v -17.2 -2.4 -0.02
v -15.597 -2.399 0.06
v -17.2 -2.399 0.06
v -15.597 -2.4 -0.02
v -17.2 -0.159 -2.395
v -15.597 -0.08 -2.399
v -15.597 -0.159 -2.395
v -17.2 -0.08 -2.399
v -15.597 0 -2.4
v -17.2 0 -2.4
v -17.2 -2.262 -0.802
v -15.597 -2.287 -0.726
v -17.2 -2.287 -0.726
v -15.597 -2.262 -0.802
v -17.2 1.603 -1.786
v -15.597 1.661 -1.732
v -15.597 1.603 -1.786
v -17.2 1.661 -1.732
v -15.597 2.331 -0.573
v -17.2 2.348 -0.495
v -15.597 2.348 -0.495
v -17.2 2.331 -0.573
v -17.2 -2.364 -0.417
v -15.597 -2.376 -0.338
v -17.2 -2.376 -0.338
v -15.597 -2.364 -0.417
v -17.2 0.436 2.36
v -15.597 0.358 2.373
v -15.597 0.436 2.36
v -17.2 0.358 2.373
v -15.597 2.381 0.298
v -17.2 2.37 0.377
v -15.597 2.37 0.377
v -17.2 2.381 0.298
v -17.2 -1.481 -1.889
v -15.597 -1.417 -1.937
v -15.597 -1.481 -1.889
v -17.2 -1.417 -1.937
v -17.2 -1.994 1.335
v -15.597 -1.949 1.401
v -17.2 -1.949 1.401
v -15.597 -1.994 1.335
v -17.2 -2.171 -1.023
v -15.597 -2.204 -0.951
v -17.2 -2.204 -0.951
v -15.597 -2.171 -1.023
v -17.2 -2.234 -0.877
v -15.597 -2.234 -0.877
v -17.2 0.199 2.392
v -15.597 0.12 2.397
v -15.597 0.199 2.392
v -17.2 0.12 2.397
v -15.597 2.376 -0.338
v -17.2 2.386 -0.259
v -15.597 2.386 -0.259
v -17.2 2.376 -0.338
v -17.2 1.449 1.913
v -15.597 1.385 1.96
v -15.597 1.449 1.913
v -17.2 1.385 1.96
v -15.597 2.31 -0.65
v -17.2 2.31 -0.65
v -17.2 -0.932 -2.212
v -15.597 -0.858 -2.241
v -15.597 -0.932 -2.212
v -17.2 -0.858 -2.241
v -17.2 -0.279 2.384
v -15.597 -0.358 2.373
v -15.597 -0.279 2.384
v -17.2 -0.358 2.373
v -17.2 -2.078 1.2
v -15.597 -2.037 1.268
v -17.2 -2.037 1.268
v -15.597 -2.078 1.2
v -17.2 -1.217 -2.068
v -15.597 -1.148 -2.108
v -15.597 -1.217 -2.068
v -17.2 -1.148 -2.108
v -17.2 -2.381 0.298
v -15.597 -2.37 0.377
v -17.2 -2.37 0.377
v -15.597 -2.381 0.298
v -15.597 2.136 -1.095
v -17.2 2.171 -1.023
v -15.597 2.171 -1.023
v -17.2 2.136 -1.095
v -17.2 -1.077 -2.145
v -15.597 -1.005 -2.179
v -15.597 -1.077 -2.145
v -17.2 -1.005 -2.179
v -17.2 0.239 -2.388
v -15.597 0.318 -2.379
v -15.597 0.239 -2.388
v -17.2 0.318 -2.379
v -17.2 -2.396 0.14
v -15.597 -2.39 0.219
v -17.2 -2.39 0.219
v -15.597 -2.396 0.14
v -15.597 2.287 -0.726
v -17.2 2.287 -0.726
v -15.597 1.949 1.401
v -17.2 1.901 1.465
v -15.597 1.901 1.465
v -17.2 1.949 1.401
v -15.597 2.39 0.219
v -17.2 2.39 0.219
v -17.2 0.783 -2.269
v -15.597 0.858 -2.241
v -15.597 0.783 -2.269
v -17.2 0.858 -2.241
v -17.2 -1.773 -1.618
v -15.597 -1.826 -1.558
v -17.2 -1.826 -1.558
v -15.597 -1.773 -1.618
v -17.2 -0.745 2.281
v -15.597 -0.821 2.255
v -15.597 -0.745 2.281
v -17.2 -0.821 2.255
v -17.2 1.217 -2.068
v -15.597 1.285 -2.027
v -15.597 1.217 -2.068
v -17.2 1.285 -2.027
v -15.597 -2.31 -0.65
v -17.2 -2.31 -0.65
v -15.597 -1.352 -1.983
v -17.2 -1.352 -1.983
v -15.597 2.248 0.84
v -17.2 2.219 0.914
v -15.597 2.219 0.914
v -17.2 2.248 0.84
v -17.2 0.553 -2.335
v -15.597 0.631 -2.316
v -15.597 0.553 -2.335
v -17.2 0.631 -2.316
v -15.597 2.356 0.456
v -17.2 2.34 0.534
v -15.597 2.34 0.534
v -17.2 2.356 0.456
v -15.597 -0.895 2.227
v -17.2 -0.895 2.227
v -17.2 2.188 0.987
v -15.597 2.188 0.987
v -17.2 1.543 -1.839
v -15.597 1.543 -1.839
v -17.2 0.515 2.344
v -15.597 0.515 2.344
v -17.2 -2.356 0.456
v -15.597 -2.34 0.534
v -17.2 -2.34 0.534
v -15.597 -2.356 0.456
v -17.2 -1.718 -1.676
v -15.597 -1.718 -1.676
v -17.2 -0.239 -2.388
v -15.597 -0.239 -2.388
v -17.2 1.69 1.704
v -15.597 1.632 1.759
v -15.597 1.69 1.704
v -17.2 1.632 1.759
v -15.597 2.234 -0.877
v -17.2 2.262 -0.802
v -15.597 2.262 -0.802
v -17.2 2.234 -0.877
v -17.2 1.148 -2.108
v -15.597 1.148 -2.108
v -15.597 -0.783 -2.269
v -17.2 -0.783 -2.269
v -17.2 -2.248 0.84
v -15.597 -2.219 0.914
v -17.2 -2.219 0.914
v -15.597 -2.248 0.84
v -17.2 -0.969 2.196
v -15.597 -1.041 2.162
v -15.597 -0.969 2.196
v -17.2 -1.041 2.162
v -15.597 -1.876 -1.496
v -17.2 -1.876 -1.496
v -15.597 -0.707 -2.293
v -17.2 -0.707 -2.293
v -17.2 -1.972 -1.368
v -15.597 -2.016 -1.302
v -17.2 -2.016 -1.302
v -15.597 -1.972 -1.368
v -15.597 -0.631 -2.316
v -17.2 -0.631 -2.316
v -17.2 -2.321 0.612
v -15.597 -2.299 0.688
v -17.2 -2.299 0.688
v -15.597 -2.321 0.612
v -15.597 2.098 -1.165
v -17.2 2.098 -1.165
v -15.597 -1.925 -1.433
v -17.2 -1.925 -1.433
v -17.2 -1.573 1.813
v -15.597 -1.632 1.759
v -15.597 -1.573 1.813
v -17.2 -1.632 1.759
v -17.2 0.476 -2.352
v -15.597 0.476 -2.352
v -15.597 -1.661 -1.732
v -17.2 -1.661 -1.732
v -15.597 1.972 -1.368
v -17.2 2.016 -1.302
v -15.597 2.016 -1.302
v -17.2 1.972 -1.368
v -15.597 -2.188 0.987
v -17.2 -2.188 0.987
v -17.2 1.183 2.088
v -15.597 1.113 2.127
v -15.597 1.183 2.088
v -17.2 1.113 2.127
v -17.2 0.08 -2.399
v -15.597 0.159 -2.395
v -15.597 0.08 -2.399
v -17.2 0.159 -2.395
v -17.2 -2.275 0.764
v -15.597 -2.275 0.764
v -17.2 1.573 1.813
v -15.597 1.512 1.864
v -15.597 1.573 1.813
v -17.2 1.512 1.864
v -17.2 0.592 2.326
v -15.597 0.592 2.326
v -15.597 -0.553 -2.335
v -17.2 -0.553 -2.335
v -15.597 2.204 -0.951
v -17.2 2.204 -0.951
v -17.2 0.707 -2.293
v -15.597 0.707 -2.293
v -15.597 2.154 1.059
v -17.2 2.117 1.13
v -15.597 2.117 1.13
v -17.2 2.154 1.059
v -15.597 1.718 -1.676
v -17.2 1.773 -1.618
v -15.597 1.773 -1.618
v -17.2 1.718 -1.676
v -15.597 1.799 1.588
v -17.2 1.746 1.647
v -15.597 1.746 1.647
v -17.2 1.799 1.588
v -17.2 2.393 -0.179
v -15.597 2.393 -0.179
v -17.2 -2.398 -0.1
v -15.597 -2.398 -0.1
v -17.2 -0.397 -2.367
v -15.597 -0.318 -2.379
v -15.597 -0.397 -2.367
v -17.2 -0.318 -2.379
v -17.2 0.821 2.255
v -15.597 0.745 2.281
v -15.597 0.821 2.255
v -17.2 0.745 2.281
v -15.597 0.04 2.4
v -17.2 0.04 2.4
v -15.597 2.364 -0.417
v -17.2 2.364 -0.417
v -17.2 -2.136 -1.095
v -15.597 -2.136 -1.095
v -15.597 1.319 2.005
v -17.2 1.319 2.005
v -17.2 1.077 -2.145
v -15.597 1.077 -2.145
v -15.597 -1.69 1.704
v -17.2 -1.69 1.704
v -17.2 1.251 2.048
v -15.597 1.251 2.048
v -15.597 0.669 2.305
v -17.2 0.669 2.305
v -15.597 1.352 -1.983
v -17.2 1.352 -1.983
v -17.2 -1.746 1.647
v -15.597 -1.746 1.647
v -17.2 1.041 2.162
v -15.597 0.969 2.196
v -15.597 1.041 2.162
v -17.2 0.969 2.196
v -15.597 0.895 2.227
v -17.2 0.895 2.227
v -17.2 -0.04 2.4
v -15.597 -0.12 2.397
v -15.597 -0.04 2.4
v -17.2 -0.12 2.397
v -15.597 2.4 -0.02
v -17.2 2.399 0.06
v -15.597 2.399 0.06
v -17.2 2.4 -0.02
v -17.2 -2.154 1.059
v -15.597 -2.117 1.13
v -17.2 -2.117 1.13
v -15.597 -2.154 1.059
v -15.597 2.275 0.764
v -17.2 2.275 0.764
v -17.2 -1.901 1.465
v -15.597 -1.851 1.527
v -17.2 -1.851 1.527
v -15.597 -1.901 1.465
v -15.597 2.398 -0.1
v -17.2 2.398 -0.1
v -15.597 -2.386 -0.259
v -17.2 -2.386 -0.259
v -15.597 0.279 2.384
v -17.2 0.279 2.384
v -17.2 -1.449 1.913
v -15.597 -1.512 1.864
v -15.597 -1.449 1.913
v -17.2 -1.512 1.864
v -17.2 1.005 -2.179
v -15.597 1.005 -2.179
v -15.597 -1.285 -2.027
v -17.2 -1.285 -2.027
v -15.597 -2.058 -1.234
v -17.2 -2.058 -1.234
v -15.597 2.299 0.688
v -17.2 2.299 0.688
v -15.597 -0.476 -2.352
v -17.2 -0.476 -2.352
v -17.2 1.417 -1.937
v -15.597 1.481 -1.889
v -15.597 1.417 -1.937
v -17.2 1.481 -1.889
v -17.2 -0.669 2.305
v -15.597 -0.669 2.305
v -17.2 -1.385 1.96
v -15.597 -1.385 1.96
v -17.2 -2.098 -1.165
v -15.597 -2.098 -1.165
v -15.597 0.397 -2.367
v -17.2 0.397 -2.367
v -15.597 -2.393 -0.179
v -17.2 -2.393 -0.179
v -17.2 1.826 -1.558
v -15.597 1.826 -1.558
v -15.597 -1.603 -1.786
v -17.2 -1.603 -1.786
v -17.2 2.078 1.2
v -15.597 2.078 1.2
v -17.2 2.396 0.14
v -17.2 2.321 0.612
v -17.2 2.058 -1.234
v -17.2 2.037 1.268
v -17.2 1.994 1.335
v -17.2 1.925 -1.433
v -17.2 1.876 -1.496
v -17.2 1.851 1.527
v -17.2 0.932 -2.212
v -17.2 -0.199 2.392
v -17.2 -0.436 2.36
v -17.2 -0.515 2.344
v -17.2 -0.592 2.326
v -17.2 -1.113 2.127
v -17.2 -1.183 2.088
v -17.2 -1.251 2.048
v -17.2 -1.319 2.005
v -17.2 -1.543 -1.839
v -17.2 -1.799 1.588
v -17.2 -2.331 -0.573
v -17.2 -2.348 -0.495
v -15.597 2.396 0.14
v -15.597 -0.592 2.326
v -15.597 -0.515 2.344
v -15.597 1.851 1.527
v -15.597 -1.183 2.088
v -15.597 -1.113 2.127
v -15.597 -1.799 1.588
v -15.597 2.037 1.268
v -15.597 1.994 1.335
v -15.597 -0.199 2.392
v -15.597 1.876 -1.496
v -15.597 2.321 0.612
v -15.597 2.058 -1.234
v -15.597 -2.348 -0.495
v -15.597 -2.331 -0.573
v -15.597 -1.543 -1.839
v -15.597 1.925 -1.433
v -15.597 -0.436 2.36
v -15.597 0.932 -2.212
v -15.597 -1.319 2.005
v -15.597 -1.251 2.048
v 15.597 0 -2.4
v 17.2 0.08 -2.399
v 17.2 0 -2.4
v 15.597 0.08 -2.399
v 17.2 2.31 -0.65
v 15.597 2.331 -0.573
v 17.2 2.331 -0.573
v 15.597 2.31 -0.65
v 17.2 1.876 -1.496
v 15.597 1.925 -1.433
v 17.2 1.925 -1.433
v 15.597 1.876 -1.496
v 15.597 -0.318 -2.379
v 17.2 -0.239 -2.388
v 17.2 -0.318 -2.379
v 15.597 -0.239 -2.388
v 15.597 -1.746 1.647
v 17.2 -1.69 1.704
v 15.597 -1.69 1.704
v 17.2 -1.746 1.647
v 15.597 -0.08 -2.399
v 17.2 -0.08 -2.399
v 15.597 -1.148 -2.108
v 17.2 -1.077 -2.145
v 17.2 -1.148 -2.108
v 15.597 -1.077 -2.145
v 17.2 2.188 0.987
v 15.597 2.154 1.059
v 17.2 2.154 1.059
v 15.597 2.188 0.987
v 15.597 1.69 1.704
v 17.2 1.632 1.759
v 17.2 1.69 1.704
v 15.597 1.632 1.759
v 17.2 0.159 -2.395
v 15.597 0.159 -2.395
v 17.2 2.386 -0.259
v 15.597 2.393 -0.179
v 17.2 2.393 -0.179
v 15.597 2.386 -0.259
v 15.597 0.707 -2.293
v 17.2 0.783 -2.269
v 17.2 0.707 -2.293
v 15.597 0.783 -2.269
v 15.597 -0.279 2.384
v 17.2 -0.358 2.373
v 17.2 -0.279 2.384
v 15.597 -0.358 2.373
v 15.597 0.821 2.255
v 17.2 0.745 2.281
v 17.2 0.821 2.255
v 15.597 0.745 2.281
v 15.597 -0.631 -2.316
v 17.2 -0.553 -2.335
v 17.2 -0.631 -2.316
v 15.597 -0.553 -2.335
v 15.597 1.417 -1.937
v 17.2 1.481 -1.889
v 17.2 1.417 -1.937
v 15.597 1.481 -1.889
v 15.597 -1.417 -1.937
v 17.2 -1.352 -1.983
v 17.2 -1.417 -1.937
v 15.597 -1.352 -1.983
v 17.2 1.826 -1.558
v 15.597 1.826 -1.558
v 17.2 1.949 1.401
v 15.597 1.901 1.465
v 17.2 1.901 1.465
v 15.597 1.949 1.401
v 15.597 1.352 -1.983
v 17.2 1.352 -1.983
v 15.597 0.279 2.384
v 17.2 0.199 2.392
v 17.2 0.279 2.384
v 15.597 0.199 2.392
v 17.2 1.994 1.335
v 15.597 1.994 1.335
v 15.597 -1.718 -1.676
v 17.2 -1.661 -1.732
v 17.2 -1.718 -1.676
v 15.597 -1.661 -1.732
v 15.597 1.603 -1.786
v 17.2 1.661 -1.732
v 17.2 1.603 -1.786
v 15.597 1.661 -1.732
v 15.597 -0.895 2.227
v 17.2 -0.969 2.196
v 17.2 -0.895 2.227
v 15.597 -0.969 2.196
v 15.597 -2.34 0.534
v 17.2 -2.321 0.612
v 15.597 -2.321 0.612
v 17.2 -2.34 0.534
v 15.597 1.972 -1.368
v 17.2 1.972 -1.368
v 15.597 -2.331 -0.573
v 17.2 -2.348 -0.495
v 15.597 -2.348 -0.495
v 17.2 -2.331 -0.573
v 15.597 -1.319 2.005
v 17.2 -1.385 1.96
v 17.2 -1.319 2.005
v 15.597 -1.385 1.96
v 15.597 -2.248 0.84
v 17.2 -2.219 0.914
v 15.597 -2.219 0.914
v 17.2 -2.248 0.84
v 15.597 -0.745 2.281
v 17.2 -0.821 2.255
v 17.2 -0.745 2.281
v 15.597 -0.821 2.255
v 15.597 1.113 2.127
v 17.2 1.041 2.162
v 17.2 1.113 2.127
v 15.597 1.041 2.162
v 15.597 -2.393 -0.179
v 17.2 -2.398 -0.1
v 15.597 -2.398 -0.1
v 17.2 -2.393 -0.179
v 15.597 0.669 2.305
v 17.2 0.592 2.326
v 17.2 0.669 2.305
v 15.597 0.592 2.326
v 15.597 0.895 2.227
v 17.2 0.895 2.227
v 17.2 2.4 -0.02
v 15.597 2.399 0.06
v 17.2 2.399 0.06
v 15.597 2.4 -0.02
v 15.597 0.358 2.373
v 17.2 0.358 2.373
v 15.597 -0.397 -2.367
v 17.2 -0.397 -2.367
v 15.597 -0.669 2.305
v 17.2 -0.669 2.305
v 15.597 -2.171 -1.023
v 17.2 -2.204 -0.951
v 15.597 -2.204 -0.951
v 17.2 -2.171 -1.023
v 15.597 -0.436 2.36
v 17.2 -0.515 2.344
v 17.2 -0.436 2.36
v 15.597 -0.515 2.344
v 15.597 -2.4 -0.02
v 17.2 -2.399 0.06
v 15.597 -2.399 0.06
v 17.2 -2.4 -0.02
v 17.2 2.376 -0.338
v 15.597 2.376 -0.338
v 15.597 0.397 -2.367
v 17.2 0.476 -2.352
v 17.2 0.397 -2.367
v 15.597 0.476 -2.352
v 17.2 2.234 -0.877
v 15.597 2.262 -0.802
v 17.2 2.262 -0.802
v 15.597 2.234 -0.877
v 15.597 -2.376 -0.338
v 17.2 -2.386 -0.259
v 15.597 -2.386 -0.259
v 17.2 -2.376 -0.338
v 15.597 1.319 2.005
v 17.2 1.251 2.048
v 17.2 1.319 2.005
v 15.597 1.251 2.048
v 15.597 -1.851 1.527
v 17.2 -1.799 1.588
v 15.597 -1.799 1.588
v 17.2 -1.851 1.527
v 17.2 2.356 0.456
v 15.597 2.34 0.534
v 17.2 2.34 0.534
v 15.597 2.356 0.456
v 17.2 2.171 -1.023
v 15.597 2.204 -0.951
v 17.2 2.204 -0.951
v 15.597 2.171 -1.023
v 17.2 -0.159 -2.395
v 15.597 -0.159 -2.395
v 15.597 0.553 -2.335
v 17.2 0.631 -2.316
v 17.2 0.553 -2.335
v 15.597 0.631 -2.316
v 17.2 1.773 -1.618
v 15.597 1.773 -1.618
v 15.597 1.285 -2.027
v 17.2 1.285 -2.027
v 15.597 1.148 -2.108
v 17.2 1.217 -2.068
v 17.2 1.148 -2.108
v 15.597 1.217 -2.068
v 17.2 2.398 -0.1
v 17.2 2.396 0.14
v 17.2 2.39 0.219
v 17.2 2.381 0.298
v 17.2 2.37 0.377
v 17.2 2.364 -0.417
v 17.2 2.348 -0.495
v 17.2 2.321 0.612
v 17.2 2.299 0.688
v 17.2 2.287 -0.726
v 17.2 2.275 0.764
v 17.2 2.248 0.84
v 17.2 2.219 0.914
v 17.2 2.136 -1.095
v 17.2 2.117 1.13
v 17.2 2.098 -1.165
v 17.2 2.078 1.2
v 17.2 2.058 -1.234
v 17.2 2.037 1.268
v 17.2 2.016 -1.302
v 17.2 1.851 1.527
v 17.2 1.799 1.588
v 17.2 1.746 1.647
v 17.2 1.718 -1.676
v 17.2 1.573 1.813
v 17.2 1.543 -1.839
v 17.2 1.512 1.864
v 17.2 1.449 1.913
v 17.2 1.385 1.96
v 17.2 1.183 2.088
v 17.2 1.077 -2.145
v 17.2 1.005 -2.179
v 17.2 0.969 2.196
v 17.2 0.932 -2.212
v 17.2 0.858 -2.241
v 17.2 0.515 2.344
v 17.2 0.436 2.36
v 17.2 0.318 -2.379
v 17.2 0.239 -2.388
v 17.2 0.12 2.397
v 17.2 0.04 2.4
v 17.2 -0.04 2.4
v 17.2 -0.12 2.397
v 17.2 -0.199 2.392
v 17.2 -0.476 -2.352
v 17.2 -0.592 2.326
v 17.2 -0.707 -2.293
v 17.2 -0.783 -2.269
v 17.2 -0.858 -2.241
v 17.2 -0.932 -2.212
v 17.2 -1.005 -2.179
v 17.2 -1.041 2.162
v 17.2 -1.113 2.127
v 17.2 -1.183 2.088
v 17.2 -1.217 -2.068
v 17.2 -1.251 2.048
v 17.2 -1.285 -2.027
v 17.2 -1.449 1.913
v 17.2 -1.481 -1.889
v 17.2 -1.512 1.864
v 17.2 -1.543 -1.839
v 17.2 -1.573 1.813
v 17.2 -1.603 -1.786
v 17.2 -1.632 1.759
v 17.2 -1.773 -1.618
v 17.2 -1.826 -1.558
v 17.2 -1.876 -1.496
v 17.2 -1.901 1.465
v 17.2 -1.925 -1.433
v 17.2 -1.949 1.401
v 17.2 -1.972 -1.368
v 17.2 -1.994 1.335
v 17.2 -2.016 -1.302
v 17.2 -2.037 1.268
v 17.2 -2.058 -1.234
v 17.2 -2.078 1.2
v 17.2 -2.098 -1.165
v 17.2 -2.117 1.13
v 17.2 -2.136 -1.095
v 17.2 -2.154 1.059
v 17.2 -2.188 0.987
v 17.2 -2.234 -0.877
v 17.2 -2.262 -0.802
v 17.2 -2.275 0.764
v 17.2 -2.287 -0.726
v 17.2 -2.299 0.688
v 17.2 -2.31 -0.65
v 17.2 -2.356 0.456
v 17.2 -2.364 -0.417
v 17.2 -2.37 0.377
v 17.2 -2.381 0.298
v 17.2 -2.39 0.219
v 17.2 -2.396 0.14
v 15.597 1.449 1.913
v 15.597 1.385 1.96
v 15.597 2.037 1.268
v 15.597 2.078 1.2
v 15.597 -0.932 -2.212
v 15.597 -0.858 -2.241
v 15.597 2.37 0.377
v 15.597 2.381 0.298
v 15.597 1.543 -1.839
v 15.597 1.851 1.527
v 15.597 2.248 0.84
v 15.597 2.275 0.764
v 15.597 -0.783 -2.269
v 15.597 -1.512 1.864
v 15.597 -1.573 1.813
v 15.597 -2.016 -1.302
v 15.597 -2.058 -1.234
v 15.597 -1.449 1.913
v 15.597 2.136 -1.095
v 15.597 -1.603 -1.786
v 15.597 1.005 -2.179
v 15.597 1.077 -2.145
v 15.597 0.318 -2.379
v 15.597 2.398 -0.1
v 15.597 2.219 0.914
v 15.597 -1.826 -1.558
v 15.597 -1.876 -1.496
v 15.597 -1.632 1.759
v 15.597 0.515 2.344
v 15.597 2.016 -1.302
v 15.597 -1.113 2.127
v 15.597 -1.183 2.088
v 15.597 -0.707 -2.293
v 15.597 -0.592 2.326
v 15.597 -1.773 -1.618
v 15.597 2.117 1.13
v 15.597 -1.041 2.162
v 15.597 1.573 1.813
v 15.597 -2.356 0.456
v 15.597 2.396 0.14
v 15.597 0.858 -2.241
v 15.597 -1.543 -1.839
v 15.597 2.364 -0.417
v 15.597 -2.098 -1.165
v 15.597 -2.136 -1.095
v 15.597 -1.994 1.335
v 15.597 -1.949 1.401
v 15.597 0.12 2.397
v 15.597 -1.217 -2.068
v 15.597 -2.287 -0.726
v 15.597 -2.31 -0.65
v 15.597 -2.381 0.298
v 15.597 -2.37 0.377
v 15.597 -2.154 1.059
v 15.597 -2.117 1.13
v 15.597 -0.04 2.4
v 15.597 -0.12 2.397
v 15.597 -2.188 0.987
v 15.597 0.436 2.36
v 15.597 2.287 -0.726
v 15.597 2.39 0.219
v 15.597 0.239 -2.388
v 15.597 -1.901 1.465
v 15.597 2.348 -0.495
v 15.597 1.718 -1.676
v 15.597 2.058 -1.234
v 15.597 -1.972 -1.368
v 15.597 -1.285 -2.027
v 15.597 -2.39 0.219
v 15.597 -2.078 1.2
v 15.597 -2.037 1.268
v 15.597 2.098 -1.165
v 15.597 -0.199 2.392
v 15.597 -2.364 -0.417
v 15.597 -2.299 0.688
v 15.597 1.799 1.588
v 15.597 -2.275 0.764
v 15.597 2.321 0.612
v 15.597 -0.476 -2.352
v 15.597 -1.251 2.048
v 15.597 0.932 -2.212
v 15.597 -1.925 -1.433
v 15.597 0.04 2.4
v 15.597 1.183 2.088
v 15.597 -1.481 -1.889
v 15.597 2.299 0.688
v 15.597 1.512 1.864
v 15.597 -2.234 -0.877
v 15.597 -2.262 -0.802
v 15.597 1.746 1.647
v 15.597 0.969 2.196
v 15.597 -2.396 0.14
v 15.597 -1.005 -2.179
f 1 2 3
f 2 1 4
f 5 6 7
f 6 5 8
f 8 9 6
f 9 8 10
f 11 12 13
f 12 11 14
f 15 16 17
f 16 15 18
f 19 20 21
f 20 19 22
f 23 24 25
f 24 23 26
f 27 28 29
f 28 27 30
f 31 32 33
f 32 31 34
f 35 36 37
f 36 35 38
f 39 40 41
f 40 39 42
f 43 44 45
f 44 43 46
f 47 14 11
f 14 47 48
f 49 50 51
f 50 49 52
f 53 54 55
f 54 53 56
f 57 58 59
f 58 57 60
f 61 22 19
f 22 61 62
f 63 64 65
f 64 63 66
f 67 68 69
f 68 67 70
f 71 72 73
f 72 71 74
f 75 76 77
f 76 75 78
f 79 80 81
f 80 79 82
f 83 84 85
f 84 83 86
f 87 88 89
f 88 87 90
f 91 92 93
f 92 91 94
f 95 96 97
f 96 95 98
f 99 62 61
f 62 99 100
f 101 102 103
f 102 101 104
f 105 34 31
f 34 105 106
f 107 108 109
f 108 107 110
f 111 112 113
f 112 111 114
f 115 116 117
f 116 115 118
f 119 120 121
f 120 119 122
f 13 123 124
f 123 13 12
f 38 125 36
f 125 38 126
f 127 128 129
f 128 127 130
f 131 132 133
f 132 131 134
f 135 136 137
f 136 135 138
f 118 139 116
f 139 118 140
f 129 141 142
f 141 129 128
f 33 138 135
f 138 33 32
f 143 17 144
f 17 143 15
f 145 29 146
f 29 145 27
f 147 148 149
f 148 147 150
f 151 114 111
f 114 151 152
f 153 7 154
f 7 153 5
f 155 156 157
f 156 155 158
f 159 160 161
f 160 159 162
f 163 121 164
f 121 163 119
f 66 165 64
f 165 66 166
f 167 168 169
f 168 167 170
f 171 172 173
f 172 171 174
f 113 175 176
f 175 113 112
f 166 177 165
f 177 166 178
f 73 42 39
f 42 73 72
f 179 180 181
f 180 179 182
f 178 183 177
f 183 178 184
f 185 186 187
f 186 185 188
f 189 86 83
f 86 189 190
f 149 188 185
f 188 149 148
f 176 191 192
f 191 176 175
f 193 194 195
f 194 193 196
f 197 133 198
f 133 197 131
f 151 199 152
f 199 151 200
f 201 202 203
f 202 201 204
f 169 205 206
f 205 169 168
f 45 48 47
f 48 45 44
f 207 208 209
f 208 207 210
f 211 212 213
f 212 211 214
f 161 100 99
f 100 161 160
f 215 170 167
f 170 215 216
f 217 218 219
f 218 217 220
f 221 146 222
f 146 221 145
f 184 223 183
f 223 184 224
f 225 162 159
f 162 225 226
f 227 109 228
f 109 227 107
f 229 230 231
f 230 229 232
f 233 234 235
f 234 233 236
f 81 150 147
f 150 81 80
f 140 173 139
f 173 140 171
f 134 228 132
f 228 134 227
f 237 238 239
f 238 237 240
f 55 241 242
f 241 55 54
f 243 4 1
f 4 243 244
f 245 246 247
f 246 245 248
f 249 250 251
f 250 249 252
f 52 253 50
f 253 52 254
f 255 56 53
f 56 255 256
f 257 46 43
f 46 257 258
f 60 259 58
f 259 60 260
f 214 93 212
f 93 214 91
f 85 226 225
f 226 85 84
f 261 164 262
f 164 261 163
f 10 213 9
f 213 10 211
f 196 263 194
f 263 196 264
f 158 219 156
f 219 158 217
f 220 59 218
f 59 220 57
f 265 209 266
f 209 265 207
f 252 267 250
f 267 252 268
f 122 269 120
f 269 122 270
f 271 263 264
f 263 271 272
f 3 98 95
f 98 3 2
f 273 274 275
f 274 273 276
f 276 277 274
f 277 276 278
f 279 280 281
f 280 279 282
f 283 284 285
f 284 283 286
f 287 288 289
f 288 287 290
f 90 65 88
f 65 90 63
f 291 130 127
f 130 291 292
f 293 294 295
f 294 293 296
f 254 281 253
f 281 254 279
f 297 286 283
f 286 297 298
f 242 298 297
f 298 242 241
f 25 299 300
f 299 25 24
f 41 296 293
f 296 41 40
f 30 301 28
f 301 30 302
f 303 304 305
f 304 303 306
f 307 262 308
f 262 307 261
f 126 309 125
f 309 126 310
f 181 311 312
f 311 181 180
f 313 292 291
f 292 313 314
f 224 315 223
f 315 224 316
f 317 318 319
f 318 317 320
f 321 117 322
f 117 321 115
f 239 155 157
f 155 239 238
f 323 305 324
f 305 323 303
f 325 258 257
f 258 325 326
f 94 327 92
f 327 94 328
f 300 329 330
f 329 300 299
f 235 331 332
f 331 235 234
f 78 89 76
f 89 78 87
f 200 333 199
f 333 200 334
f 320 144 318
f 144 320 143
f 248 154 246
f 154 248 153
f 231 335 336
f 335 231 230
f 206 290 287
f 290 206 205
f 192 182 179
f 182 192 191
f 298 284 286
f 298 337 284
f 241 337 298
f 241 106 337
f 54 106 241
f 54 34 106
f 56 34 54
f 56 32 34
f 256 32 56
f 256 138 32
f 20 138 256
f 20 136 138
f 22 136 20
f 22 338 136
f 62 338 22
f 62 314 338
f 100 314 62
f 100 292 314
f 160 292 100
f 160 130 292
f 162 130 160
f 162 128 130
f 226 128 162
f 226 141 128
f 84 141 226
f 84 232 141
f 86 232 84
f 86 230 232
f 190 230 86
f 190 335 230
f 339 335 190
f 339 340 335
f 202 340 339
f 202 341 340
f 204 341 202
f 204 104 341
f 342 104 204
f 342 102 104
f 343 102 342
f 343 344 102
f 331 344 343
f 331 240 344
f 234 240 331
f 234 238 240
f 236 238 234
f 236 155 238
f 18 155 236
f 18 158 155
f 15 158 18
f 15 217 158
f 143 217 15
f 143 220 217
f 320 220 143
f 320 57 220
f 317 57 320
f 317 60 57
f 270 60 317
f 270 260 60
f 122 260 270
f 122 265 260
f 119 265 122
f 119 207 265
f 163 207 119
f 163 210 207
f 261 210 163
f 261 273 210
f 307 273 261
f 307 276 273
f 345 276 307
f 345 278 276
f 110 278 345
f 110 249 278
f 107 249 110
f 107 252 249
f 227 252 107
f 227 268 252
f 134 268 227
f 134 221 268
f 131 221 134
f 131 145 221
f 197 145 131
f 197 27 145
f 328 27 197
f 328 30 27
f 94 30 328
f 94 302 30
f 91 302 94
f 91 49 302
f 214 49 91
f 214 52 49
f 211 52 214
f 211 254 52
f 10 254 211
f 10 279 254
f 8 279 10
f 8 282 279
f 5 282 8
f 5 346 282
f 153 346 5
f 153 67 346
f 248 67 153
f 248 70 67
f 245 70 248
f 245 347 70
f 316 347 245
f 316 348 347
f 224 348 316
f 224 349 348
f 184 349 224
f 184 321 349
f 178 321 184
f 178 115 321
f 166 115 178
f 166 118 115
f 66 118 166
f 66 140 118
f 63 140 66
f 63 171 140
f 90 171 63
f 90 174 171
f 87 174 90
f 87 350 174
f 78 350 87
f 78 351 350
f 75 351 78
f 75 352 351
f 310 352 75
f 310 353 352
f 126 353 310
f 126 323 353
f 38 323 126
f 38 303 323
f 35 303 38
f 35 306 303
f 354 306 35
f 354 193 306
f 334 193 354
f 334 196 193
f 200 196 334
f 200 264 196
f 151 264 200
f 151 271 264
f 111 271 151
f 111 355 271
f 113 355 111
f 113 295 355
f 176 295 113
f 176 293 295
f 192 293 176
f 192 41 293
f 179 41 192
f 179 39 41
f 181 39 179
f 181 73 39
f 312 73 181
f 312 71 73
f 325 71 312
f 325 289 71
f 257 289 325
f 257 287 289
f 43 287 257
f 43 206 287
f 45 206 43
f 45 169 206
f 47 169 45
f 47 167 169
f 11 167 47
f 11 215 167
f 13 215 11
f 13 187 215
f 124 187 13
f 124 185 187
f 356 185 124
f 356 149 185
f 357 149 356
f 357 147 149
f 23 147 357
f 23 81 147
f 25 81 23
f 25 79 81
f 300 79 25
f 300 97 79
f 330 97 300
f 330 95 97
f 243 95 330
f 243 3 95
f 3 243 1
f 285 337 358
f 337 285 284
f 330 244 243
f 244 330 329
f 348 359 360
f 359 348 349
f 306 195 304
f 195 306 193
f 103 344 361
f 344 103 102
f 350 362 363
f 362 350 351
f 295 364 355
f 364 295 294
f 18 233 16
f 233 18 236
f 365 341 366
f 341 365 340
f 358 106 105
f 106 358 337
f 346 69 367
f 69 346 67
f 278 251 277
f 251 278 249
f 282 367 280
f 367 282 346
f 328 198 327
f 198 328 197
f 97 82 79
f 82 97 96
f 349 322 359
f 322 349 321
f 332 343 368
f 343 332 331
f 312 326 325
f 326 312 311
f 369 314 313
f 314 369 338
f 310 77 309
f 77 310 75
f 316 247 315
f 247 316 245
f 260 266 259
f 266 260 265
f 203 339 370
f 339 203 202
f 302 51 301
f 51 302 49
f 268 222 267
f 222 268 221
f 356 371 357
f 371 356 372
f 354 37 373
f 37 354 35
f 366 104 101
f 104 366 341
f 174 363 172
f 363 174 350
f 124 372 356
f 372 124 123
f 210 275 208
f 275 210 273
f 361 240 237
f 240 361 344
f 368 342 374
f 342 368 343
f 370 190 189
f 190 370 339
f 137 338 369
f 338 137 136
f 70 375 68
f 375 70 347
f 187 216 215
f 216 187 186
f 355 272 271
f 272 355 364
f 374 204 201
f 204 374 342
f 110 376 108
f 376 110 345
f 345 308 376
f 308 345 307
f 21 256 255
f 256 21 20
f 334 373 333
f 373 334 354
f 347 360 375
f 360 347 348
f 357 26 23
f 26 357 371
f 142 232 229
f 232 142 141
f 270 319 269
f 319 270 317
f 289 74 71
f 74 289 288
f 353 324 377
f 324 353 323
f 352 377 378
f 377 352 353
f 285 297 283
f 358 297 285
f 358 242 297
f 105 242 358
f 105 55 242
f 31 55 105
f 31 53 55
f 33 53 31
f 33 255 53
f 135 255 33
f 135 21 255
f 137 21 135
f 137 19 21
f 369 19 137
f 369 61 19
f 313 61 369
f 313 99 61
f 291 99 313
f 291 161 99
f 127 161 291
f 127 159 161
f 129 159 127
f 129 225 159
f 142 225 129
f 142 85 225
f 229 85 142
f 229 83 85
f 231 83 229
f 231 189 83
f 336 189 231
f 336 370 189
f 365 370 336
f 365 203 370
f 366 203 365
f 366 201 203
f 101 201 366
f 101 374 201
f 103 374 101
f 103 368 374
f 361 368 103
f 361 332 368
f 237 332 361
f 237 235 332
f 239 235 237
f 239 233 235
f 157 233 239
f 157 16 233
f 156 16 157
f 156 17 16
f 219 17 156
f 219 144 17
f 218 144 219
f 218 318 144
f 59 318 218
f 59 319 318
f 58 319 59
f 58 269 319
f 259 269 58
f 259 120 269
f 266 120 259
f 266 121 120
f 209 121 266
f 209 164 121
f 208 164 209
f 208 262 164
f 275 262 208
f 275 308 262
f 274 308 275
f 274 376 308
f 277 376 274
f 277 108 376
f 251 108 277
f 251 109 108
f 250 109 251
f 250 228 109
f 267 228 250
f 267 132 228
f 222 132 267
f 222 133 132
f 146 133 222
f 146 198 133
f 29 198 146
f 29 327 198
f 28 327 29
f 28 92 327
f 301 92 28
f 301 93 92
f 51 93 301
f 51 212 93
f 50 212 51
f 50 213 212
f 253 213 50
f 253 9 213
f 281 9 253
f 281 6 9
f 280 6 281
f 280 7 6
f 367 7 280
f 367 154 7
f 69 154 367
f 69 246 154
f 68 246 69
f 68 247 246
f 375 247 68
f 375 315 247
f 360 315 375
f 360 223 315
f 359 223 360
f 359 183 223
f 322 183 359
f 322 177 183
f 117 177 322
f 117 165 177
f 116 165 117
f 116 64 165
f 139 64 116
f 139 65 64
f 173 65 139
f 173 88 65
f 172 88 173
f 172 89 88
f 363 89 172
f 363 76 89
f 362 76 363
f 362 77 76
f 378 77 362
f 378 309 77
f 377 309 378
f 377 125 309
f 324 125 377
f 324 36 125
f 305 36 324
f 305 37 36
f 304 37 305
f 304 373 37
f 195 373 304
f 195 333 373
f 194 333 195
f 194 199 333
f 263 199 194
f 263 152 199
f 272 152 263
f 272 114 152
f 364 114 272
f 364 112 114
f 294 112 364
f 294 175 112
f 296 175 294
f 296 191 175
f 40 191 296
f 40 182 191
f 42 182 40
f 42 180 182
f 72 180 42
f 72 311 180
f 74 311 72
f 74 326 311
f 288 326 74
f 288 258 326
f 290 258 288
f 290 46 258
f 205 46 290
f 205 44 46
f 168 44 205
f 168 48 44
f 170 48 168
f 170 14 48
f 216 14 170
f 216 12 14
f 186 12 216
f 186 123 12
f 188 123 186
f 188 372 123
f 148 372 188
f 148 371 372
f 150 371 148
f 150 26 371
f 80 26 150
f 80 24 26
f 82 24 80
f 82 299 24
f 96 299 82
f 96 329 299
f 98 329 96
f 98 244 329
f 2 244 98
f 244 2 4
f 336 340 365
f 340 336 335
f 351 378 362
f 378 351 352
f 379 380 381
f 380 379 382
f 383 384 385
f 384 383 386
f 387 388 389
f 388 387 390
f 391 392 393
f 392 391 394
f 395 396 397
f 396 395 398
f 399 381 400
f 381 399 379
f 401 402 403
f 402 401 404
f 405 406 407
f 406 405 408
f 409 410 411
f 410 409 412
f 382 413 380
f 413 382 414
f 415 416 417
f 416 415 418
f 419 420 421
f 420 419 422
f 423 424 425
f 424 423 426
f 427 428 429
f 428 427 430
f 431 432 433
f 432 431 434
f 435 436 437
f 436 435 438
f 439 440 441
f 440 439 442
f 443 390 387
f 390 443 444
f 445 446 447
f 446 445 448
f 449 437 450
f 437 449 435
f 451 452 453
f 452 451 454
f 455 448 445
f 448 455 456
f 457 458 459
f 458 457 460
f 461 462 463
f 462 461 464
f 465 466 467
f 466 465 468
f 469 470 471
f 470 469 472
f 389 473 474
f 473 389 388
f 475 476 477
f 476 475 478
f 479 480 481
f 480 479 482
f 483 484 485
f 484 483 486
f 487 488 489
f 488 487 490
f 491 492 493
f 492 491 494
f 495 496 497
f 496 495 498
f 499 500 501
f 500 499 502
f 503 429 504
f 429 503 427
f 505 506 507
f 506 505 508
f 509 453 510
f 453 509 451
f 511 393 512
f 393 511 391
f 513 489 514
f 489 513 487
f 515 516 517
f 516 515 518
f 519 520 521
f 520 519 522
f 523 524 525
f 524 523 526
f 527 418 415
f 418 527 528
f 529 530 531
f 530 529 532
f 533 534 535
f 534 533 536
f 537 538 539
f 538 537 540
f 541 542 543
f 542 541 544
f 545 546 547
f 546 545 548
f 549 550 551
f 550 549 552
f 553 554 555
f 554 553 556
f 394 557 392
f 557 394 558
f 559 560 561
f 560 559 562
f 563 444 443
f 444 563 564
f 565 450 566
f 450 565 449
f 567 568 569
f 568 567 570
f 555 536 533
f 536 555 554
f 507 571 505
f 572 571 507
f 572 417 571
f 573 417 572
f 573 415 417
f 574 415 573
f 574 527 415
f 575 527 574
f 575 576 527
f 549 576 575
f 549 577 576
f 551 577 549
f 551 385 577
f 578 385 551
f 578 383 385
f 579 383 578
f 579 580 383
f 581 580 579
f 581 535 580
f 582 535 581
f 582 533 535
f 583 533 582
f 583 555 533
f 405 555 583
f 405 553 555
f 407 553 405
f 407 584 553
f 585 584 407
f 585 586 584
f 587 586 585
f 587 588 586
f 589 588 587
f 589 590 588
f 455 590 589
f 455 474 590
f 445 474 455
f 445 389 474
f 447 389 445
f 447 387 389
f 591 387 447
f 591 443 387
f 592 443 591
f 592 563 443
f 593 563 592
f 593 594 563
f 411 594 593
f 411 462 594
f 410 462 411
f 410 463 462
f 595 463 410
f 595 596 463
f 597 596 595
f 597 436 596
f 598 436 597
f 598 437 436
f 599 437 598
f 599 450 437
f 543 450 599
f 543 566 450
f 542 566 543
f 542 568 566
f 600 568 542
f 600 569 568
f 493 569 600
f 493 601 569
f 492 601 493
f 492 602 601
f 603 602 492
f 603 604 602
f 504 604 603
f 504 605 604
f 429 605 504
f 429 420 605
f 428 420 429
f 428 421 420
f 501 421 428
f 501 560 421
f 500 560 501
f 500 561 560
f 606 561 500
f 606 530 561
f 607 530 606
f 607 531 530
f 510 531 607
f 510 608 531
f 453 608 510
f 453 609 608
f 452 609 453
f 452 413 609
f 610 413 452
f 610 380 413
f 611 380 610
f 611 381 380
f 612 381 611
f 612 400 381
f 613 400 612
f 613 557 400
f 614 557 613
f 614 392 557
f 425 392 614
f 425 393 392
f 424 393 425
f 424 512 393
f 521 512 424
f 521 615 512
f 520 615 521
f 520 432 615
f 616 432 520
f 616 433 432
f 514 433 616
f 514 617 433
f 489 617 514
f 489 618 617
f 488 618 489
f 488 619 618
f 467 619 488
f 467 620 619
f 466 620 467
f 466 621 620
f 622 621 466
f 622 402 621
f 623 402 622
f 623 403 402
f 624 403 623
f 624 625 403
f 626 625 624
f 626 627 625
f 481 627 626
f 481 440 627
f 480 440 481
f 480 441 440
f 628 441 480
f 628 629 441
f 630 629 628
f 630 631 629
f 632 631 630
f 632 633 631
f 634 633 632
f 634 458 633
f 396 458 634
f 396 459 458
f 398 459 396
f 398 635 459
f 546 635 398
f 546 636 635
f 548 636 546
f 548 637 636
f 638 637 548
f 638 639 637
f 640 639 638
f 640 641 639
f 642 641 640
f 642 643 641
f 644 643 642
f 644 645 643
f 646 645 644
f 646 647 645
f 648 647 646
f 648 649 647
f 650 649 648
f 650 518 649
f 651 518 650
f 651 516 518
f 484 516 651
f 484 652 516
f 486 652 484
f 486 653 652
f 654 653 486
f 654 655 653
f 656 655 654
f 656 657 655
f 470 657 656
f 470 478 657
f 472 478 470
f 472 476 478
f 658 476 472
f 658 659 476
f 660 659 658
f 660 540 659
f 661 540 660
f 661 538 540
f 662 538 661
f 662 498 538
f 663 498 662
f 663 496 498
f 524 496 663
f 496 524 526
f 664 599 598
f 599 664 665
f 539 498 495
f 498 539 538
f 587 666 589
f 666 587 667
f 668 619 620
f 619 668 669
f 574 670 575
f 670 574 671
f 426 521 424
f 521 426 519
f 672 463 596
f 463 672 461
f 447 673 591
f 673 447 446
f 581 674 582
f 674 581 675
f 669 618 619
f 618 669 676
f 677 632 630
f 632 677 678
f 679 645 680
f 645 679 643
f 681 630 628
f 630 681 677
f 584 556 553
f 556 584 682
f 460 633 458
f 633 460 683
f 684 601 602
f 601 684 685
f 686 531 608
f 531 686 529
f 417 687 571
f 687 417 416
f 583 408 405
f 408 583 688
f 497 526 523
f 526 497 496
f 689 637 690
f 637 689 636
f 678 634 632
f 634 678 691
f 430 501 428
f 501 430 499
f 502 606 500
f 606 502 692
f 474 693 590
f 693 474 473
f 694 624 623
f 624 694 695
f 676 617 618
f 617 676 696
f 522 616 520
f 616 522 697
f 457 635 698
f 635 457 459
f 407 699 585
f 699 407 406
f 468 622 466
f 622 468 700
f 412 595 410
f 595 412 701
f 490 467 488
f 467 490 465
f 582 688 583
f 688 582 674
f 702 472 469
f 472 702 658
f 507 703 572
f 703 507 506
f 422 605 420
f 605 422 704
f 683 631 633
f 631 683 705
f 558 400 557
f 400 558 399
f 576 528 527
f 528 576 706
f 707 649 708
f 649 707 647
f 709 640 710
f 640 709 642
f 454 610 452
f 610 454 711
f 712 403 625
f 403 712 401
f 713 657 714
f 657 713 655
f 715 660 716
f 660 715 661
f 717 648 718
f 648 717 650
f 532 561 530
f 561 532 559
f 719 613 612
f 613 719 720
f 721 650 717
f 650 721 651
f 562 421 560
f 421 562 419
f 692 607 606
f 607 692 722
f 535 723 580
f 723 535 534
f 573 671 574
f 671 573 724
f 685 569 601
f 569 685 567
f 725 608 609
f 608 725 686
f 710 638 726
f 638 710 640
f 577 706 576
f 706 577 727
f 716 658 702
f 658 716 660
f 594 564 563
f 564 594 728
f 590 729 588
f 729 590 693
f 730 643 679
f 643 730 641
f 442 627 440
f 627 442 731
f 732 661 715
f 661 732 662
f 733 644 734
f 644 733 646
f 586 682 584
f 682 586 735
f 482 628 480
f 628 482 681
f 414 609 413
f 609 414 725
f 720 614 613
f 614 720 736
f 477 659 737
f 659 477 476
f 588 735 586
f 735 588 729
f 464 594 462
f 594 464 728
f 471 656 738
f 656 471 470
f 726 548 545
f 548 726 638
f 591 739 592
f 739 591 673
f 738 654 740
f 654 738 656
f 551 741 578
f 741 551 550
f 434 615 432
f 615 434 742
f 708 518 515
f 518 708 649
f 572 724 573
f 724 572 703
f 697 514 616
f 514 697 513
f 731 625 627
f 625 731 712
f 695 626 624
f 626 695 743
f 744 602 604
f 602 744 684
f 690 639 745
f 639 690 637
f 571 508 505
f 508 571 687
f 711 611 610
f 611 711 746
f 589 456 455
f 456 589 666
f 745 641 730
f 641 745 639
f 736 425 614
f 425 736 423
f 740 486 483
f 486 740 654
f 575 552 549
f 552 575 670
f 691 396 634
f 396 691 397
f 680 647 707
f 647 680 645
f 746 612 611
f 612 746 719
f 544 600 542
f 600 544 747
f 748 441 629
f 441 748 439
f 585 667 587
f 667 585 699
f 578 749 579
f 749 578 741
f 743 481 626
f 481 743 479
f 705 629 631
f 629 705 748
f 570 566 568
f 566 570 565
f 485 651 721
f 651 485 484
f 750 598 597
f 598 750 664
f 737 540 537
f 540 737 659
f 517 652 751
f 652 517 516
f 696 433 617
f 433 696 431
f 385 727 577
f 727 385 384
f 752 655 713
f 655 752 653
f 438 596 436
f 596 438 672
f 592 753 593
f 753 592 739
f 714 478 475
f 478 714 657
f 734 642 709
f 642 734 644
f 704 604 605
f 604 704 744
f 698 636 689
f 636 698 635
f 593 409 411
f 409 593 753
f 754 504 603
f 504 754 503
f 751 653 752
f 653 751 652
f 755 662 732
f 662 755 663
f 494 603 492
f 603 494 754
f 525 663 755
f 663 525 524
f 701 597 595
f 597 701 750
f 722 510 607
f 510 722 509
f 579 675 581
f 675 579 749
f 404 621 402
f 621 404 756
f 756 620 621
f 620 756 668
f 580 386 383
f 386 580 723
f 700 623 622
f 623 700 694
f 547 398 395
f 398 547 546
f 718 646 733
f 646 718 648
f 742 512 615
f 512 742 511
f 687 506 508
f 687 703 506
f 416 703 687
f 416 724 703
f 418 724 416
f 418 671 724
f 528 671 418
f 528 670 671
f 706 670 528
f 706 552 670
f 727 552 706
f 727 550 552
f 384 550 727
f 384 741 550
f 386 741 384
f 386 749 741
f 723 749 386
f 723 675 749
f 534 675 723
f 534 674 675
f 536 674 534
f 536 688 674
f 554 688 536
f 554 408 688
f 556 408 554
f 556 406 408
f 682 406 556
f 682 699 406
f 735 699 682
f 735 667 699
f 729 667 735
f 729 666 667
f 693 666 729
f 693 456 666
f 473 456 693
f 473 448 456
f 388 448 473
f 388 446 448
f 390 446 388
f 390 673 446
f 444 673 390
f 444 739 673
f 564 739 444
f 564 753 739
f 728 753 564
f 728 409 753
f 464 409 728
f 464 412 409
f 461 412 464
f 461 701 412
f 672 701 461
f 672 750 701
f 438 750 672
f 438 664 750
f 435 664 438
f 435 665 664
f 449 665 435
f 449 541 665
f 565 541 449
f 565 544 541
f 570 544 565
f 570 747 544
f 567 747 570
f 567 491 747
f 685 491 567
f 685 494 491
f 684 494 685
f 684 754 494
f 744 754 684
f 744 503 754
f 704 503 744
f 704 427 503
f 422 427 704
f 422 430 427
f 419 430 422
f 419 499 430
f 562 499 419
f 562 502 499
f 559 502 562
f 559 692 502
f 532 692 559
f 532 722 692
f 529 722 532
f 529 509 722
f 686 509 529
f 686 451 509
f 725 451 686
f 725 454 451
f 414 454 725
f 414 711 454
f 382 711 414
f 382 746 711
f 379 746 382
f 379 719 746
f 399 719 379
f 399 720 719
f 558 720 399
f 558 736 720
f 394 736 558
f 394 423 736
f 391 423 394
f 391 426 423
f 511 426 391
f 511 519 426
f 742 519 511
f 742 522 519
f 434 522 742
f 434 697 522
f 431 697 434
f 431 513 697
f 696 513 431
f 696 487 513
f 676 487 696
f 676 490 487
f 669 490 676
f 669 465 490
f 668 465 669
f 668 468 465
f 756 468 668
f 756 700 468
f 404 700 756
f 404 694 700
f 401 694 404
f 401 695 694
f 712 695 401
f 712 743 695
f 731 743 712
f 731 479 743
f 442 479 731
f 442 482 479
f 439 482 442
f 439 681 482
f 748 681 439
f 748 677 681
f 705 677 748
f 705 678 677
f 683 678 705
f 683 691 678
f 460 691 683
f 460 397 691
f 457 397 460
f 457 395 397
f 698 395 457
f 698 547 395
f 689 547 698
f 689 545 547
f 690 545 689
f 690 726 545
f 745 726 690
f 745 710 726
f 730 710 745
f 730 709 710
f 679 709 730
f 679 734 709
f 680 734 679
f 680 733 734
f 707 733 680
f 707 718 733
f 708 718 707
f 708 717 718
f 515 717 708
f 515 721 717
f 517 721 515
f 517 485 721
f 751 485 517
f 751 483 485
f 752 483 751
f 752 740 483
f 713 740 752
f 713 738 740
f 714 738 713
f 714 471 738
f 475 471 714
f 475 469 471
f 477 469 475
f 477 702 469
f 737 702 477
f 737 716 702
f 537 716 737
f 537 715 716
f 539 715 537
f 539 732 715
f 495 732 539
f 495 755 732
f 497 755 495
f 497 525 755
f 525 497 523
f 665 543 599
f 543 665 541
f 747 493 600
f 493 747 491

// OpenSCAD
use <../lib.scad>
use <450.scad>
use <u9132.scad>
$fa=1; $fs=0.2;
function ldraw_lib__u9132c02(realsolid=false) = [
// 0 ~Axle Steel  4 x 72 with Two Wheels  6.4 x  8
// 0 Name: u9132c02.dat
// 0 Author: Magnus Forsberg [MagFors]
// 0 !LDRAW_ORG Shortcut UPDATE 2012-01
// 0 !LICENSE Licensed under CC BY 2.0 and CC BY 4.0 : see CAreadme.txt
// 
// 0 BFC CERTIFY CCW
  [0,"BFC","CERTIFY"],
  [0,"BFC","CCW"],
// 
// 0 !CATEGORY Wheel
// 
// 0 !HISTORY 2011-12-11 [Steffen] changed color 383 to 494
// 0 !HISTORY 2012-03-30 [PTadmin] Official Update 2012-01
// 
// 
// 1 16 -31 0 0 0 0 1 0 1 0 -1 0 0 450.dat
  [1,16,-31,0,0,0,0,1,0,1,0,-1,0,0, ldraw_lib__450(realsolid)],
// 1 16 31 0 0 0 0 -1 0 1 0 1 0 0 450.dat
  [1,16,31,0,0,0,0,-1,0,1,0,1,0,0, ldraw_lib__450(realsolid)],
// 1 494 0 0 0 1 0 0 0 1 0 0 0 1 u9132.dat
  [1,494,0,0,0,1,0,0,0,1,0,0,0,1, ldraw_lib__u9132(realsolid)],
];
module ldraw_lib__u9132c02(step=0, col=false, unit=2/5, alt=false, line=0.2, solid=!$preview)
    makepoly(ldraw_lib__u9132c02(solid), step=step, col=col, unit=unit, alt=alt, line=line, solid=solid);
ldraw_lib__u9132c02(line=0.2);
